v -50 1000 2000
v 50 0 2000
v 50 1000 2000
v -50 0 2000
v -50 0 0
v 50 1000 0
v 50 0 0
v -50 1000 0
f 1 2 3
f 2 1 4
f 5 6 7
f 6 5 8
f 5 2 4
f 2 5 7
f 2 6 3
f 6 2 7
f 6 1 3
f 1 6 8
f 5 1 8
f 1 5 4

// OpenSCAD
// file: templates/basic-dims.scad
unit = 1000;

section_width = unit;
section_height = unit * 2;
section_thickness = unit * 0.1;

rt = sqrt(2);

//  -- Notes --
//  Z is UP
//  X is FORWARD (out of the screen)
// main file
include <./templates/basic-dims.scad>

module simple_wall() {
    translate([-section_thickness/2, 0, 0])
    cube([section_thickness, section_width, section_height]);
}

simple_wall();
